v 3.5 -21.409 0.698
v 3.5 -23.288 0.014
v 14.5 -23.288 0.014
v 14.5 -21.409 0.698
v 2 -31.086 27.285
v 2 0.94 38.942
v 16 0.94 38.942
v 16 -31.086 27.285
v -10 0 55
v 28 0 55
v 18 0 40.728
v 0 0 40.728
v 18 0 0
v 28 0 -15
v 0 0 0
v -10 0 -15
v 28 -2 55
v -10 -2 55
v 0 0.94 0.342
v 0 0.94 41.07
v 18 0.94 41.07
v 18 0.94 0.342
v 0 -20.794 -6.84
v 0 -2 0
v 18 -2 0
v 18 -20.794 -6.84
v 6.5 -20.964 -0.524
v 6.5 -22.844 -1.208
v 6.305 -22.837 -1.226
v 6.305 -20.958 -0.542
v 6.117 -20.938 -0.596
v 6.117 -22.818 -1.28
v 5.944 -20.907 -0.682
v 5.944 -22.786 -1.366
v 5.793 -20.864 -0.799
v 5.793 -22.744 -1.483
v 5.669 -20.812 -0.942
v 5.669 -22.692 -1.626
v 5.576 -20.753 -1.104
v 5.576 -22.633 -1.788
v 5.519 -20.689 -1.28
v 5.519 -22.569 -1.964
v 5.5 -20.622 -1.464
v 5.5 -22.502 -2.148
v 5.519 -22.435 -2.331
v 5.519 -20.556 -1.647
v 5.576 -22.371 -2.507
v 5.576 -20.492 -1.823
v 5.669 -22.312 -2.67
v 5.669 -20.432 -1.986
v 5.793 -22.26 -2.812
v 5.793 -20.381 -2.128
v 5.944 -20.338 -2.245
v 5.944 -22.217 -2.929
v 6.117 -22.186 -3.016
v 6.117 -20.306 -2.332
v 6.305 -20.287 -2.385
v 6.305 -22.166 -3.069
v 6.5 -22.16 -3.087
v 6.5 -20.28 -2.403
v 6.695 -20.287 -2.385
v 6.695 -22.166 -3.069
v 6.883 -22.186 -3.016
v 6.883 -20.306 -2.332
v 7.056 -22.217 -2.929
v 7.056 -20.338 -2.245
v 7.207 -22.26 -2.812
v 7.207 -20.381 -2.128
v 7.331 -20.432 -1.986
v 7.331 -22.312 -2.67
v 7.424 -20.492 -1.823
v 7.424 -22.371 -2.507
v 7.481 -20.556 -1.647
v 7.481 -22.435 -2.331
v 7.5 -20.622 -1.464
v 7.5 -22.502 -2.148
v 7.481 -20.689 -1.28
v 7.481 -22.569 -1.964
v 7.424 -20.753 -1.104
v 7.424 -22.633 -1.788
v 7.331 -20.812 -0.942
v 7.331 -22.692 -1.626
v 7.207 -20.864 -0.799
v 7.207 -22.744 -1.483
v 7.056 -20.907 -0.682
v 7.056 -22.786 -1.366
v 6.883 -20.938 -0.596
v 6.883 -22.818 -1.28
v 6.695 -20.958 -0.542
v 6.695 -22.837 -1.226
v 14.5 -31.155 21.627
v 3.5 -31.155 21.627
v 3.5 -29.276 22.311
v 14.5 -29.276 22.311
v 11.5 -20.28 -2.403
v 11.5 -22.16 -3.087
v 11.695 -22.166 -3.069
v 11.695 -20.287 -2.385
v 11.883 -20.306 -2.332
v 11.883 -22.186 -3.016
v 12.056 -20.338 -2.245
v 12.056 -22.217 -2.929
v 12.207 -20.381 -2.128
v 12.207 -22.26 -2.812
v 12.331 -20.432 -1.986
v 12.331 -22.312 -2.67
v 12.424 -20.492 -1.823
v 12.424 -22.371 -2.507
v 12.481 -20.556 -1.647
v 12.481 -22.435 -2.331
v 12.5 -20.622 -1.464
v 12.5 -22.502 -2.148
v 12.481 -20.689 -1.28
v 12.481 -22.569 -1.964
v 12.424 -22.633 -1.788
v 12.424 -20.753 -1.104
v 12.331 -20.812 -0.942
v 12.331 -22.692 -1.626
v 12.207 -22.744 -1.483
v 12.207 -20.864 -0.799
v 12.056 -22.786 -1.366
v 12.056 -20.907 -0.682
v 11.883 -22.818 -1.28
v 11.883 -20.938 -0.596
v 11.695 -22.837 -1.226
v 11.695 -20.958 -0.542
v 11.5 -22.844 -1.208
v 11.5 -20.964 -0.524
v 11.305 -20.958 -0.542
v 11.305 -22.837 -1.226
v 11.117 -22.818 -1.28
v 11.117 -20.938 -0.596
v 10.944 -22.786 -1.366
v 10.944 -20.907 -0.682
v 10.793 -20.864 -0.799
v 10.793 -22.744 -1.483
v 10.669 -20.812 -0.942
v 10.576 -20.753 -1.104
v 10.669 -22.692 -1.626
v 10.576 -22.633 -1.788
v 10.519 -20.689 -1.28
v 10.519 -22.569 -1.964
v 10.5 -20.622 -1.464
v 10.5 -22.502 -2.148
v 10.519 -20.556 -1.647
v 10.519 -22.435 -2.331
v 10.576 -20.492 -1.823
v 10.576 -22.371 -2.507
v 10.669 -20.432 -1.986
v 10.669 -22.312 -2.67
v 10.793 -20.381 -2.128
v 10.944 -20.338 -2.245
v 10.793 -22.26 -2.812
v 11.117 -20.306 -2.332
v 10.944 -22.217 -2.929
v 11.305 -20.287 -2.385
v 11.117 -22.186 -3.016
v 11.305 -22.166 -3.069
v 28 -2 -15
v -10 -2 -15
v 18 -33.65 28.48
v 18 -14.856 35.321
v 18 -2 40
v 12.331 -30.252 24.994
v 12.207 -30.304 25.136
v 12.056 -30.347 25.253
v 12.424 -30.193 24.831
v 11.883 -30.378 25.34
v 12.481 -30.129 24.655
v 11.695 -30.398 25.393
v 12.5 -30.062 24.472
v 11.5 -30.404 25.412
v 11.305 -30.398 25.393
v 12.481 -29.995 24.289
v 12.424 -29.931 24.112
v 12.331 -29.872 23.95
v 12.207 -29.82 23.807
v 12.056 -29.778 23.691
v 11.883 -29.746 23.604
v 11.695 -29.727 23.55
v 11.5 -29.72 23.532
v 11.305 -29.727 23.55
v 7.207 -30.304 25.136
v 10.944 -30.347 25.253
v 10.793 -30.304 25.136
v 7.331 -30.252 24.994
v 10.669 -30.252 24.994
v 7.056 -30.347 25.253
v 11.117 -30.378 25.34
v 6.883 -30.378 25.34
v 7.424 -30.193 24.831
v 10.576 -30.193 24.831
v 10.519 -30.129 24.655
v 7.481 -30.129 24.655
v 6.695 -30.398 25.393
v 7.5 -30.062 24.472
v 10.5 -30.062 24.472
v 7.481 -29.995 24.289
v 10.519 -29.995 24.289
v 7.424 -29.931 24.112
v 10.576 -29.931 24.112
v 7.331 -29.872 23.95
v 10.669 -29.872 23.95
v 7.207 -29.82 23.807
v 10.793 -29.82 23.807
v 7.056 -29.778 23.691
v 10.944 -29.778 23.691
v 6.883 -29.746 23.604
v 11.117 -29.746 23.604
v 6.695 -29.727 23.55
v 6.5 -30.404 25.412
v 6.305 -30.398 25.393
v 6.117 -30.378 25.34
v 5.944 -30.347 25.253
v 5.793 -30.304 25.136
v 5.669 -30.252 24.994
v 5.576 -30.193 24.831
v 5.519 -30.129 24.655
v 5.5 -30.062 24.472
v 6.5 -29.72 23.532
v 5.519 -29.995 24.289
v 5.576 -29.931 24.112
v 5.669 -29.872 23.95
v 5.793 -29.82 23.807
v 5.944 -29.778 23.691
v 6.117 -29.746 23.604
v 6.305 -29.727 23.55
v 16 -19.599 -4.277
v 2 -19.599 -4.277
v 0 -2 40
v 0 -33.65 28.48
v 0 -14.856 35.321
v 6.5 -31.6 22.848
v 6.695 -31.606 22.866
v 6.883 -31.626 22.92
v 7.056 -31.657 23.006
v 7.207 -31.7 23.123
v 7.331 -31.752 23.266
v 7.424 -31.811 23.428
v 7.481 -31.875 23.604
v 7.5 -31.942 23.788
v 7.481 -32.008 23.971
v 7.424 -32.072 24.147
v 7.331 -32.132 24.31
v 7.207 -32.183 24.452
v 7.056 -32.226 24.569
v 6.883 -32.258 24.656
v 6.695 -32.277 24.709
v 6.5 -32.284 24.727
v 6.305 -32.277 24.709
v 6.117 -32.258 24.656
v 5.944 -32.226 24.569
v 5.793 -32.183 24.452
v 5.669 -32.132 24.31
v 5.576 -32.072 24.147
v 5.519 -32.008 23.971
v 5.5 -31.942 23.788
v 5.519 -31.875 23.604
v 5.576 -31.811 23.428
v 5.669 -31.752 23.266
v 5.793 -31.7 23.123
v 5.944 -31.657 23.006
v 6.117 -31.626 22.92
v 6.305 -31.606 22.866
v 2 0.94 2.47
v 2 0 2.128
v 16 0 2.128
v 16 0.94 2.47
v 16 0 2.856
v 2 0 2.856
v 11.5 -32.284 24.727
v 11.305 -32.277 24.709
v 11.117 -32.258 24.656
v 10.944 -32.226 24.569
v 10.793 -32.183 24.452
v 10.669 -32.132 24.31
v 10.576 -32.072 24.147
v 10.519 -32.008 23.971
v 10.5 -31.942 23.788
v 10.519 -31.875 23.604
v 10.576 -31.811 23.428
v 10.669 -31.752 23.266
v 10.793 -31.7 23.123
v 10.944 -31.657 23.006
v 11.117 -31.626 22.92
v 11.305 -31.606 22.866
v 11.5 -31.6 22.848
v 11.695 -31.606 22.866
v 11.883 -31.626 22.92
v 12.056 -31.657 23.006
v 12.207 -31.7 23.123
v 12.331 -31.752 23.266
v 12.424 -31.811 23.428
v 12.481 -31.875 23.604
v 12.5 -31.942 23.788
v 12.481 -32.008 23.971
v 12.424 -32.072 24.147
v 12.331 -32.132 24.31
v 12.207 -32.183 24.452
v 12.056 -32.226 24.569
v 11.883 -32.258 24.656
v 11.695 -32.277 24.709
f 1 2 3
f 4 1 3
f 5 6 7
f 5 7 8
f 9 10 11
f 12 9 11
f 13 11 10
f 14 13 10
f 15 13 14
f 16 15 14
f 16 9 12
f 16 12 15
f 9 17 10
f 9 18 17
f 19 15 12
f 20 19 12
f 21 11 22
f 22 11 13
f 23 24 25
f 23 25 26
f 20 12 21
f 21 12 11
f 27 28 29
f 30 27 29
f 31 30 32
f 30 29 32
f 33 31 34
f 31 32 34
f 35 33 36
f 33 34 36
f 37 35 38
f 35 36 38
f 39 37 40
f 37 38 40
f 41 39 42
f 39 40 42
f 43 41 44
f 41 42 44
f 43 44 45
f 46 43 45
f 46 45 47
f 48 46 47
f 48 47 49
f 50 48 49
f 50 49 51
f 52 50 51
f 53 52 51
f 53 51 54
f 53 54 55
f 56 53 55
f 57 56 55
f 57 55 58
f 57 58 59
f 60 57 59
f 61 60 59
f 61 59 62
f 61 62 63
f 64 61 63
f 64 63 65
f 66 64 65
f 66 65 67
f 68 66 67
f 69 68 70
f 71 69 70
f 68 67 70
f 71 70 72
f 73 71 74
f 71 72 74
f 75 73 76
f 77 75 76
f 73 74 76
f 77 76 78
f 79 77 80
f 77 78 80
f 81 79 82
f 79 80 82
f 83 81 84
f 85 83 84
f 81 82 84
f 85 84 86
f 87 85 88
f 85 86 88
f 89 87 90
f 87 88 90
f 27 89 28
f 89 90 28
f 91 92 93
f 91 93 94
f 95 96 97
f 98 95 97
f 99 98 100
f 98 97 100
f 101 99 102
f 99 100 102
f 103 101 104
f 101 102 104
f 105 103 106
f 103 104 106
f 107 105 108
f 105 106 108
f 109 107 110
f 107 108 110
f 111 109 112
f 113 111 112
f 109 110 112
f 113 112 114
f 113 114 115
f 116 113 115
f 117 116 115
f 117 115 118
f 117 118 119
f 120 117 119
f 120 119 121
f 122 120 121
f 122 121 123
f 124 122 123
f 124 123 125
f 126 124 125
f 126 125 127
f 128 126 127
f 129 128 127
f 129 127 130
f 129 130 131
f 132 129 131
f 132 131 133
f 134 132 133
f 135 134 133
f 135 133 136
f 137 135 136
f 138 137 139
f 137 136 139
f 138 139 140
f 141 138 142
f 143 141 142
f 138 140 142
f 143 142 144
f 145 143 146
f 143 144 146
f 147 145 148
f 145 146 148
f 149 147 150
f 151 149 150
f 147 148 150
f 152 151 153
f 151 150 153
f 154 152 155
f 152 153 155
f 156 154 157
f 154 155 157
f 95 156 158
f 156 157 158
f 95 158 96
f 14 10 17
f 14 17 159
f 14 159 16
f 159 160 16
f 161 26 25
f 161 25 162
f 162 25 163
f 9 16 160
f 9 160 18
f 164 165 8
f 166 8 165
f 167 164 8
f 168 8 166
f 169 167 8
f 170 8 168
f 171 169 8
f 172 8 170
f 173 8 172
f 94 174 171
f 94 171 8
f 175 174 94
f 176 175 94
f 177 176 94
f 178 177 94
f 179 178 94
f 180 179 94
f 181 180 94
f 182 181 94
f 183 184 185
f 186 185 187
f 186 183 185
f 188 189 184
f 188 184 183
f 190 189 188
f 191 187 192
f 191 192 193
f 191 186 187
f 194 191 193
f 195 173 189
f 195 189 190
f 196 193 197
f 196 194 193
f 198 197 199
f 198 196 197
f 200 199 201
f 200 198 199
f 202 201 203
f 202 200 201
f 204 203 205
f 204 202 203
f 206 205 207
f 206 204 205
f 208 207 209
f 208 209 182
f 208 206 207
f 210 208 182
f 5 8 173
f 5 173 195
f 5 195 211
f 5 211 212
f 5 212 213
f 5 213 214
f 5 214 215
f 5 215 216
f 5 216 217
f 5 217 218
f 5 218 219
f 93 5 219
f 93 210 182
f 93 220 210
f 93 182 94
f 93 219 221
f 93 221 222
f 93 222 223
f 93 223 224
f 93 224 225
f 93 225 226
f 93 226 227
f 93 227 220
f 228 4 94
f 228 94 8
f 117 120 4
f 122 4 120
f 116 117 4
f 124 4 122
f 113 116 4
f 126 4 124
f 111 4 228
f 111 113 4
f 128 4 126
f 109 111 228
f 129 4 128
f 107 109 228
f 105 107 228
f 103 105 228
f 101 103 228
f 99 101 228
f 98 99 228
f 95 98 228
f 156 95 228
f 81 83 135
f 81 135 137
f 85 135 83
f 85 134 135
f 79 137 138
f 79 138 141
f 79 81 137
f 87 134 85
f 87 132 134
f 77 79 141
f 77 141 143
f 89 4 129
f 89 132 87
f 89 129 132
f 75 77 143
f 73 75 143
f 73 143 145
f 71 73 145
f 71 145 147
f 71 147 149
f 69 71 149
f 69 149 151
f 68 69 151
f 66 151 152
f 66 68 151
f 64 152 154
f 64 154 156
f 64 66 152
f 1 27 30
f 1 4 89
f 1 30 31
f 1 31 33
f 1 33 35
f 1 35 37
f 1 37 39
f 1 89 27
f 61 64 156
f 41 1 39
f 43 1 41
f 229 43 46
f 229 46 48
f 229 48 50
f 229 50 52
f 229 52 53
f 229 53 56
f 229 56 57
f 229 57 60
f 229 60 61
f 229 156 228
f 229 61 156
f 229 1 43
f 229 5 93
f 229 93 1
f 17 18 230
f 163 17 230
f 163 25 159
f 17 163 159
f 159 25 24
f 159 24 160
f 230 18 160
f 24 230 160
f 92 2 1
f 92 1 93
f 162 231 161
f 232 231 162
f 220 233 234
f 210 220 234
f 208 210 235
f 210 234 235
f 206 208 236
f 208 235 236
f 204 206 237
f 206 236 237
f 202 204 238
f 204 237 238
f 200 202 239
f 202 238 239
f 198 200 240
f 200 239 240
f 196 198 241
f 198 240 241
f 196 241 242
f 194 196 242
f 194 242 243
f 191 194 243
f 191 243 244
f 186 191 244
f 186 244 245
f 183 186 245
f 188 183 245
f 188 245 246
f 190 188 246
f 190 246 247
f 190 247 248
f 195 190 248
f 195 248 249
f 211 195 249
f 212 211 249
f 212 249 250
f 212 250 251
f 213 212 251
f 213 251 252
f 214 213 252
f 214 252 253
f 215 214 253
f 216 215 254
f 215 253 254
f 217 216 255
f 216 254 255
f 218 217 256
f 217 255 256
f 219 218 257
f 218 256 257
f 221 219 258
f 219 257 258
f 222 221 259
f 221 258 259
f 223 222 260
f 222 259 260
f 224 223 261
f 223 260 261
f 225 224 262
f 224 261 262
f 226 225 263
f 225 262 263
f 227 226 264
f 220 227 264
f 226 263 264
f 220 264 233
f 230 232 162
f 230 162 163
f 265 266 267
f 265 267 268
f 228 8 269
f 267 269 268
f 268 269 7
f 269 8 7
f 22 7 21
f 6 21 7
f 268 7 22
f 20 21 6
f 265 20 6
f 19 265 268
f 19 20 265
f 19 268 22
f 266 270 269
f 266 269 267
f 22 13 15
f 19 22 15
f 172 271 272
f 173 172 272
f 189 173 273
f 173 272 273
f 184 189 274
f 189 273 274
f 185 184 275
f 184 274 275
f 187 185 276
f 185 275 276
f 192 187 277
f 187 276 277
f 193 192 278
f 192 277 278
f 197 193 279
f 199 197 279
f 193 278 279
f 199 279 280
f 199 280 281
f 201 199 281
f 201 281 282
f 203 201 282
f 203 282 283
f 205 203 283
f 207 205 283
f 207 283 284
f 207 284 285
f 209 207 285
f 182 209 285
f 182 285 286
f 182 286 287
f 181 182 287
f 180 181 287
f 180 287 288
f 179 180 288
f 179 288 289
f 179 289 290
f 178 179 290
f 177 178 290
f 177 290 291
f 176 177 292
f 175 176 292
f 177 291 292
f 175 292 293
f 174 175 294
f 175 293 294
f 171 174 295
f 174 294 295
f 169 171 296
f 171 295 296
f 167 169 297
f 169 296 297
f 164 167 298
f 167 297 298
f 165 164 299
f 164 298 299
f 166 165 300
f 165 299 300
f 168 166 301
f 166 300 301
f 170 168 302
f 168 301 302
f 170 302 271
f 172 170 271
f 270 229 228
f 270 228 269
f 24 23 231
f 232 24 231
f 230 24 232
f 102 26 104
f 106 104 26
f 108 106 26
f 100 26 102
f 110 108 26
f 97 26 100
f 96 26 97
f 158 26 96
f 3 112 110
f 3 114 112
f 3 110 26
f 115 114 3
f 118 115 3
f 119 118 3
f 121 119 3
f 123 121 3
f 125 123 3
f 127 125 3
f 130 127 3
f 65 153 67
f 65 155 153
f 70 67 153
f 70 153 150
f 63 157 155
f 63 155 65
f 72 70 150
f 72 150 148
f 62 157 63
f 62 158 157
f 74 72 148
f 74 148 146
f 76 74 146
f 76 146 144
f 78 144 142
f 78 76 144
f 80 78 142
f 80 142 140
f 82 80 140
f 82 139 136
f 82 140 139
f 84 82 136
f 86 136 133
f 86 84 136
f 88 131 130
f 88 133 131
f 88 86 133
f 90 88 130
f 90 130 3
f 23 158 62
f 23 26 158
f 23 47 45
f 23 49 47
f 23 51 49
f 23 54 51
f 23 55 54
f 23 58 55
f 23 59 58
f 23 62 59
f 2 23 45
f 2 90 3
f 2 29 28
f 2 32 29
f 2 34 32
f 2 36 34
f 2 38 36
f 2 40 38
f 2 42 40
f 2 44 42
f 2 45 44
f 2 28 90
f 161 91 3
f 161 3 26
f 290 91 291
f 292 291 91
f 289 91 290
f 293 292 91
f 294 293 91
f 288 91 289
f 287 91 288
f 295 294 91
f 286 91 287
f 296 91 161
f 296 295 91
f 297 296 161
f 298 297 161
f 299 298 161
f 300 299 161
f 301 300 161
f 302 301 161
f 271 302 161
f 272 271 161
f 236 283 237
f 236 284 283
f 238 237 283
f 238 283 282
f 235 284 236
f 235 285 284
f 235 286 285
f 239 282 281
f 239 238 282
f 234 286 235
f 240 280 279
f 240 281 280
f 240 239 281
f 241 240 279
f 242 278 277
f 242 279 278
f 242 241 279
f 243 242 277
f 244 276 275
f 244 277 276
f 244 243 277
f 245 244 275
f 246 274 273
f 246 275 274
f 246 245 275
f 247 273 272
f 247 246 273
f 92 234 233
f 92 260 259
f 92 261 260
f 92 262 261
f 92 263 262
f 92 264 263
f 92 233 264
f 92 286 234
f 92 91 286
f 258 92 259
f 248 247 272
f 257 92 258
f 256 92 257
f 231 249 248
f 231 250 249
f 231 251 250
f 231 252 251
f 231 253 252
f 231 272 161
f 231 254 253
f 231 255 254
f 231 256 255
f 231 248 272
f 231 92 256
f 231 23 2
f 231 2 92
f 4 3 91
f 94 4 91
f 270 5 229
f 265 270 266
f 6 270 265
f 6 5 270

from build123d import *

# Parameters (mm, degrees)
BOSS_EXTRU_1_DEPTH      = 18
BOSS_EXTRU_4_DEPTH      = 1
COQUE7_START            = 2
COQUE7_DEPTH            = 14
ESQUISSE2_R             = 1
ESQUISSE2_W             = 11
ESQUISSE2_H             = 23
ENL_V_MAT_EXTRU_1_DEPTH = 69.486359517
ESQUISSE7_W             = 70
ESQUISSE7_H             = 2
BOSS_EXTRU_5_DEPTH      = 10
ESQUISSE8_W             = 70
ESQUISSE8_H             = 2
BOSS_EXTRU_6_DEPTH      = 10


# Read off the part's stored shape, not the designer's step: Coque7
with BuildPart() as part:
    # Esquisse1 → Boss.-Extru.1 (new body)
    with BuildSketch(Plane(origin=(0, 0, 0), x_dir=(0, 0, -1), z_dir=(1, 0, 0))):
        Polygon((-35.320888862, -14.855752194), (-40, -2), (-55, -2), (-55, 0), (-40, 0), (0, 0), (15, 0), (15, -2), (0, -2), (6.840402867, -20.793852416), (-28.480485996, -33.649604609), align=None)
    extrude(amount=BOSS_EXTRU_1_DEPTH)

    # Esquisse3D1 → Boss.-Extru.4 (add, along a direction that is not the sketch's normal)
    with BuildSketch(Plane(origin=(0, 0, 0), x_dir=(0.40423775033266973, 0, 0.9146539461490243), z_dir=(0, -1, 0))):
        Polygon((0, 0), (37.251971468, 16.463771031), (44.528250974, 0), (7.276279506, -16.463771031), align=None)
    extrude(amount=-BOSS_EXTRU_4_DEPTH, dir=(0, -0.9396926207859081, -0.3420201433256695))

    # Coque7 outline → Coque7 (cut)
    with BuildSketch(Plane.YZ.offset(COQUE7_START)):
        Polygon((0, 2.856296013), (0, 2.128355545), (0.939692621, 2.470375688), (0.939692621, 38.941605067), (-31.086179081, 27.285141041), (-19.598507461, -4.276977338), align=None)
    extrude(amount=COQUE7_DEPTH, mode=Mode.SUBTRACT)

    # Esquisse2 → Enlèv. mat.-Extru.1 (cut, through all)
    with BuildSketch(Plane(origin=(0, -20.559896859, -7.483190476), x_dir=(1, 0, 0), z_dir=(0, -0.9396926207859082, -0.34202014332566943))):
        with Locations(Location((6.5, 33.277892702, 0), (0, 0, 270))):
            Circle(ESQUISSE2_R)
        with Locations(Location((11.5, 33.277892702, 0), (0, 0, 90))):
            Circle(ESQUISSE2_R)
        with Locations(Location((11.5, 5.677892702, 0), (0, 0, 270))):
            Circle(ESQUISSE2_R)
        with Locations(Location((6.5, 5.677892702, 0), (0, 0, 90))):
            Circle(ESQUISSE2_R)
        with Locations((9, 19.477892702)):
            Rectangle(ESQUISSE2_W, ESQUISSE2_H)
    extrude(amount=-ENL_V_MAT_EXTRU_1_DEPTH, mode=Mode.SUBTRACT)

    # Esquisse7 → Boss.-Extru.5 (add)
    with BuildSketch(Plane.ZY):
        with Locations((20, -1)):
            Rectangle(ESQUISSE7_W, ESQUISSE7_H)
    extrude(amount=BOSS_EXTRU_5_DEPTH)

    # Esquisse8 → Boss.-Extru.6 (add)
    with BuildSketch(Plane(origin=(18, 0, 0), x_dir=(0, 0, -1), z_dir=(1, 0, 0))):
        with Locations((-20, -1)):
            Rectangle(ESQUISSE8_W, ESQUISSE8_H)
    extrude(amount=BOSS_EXTRU_6_DEPTH)


solid = part.part
